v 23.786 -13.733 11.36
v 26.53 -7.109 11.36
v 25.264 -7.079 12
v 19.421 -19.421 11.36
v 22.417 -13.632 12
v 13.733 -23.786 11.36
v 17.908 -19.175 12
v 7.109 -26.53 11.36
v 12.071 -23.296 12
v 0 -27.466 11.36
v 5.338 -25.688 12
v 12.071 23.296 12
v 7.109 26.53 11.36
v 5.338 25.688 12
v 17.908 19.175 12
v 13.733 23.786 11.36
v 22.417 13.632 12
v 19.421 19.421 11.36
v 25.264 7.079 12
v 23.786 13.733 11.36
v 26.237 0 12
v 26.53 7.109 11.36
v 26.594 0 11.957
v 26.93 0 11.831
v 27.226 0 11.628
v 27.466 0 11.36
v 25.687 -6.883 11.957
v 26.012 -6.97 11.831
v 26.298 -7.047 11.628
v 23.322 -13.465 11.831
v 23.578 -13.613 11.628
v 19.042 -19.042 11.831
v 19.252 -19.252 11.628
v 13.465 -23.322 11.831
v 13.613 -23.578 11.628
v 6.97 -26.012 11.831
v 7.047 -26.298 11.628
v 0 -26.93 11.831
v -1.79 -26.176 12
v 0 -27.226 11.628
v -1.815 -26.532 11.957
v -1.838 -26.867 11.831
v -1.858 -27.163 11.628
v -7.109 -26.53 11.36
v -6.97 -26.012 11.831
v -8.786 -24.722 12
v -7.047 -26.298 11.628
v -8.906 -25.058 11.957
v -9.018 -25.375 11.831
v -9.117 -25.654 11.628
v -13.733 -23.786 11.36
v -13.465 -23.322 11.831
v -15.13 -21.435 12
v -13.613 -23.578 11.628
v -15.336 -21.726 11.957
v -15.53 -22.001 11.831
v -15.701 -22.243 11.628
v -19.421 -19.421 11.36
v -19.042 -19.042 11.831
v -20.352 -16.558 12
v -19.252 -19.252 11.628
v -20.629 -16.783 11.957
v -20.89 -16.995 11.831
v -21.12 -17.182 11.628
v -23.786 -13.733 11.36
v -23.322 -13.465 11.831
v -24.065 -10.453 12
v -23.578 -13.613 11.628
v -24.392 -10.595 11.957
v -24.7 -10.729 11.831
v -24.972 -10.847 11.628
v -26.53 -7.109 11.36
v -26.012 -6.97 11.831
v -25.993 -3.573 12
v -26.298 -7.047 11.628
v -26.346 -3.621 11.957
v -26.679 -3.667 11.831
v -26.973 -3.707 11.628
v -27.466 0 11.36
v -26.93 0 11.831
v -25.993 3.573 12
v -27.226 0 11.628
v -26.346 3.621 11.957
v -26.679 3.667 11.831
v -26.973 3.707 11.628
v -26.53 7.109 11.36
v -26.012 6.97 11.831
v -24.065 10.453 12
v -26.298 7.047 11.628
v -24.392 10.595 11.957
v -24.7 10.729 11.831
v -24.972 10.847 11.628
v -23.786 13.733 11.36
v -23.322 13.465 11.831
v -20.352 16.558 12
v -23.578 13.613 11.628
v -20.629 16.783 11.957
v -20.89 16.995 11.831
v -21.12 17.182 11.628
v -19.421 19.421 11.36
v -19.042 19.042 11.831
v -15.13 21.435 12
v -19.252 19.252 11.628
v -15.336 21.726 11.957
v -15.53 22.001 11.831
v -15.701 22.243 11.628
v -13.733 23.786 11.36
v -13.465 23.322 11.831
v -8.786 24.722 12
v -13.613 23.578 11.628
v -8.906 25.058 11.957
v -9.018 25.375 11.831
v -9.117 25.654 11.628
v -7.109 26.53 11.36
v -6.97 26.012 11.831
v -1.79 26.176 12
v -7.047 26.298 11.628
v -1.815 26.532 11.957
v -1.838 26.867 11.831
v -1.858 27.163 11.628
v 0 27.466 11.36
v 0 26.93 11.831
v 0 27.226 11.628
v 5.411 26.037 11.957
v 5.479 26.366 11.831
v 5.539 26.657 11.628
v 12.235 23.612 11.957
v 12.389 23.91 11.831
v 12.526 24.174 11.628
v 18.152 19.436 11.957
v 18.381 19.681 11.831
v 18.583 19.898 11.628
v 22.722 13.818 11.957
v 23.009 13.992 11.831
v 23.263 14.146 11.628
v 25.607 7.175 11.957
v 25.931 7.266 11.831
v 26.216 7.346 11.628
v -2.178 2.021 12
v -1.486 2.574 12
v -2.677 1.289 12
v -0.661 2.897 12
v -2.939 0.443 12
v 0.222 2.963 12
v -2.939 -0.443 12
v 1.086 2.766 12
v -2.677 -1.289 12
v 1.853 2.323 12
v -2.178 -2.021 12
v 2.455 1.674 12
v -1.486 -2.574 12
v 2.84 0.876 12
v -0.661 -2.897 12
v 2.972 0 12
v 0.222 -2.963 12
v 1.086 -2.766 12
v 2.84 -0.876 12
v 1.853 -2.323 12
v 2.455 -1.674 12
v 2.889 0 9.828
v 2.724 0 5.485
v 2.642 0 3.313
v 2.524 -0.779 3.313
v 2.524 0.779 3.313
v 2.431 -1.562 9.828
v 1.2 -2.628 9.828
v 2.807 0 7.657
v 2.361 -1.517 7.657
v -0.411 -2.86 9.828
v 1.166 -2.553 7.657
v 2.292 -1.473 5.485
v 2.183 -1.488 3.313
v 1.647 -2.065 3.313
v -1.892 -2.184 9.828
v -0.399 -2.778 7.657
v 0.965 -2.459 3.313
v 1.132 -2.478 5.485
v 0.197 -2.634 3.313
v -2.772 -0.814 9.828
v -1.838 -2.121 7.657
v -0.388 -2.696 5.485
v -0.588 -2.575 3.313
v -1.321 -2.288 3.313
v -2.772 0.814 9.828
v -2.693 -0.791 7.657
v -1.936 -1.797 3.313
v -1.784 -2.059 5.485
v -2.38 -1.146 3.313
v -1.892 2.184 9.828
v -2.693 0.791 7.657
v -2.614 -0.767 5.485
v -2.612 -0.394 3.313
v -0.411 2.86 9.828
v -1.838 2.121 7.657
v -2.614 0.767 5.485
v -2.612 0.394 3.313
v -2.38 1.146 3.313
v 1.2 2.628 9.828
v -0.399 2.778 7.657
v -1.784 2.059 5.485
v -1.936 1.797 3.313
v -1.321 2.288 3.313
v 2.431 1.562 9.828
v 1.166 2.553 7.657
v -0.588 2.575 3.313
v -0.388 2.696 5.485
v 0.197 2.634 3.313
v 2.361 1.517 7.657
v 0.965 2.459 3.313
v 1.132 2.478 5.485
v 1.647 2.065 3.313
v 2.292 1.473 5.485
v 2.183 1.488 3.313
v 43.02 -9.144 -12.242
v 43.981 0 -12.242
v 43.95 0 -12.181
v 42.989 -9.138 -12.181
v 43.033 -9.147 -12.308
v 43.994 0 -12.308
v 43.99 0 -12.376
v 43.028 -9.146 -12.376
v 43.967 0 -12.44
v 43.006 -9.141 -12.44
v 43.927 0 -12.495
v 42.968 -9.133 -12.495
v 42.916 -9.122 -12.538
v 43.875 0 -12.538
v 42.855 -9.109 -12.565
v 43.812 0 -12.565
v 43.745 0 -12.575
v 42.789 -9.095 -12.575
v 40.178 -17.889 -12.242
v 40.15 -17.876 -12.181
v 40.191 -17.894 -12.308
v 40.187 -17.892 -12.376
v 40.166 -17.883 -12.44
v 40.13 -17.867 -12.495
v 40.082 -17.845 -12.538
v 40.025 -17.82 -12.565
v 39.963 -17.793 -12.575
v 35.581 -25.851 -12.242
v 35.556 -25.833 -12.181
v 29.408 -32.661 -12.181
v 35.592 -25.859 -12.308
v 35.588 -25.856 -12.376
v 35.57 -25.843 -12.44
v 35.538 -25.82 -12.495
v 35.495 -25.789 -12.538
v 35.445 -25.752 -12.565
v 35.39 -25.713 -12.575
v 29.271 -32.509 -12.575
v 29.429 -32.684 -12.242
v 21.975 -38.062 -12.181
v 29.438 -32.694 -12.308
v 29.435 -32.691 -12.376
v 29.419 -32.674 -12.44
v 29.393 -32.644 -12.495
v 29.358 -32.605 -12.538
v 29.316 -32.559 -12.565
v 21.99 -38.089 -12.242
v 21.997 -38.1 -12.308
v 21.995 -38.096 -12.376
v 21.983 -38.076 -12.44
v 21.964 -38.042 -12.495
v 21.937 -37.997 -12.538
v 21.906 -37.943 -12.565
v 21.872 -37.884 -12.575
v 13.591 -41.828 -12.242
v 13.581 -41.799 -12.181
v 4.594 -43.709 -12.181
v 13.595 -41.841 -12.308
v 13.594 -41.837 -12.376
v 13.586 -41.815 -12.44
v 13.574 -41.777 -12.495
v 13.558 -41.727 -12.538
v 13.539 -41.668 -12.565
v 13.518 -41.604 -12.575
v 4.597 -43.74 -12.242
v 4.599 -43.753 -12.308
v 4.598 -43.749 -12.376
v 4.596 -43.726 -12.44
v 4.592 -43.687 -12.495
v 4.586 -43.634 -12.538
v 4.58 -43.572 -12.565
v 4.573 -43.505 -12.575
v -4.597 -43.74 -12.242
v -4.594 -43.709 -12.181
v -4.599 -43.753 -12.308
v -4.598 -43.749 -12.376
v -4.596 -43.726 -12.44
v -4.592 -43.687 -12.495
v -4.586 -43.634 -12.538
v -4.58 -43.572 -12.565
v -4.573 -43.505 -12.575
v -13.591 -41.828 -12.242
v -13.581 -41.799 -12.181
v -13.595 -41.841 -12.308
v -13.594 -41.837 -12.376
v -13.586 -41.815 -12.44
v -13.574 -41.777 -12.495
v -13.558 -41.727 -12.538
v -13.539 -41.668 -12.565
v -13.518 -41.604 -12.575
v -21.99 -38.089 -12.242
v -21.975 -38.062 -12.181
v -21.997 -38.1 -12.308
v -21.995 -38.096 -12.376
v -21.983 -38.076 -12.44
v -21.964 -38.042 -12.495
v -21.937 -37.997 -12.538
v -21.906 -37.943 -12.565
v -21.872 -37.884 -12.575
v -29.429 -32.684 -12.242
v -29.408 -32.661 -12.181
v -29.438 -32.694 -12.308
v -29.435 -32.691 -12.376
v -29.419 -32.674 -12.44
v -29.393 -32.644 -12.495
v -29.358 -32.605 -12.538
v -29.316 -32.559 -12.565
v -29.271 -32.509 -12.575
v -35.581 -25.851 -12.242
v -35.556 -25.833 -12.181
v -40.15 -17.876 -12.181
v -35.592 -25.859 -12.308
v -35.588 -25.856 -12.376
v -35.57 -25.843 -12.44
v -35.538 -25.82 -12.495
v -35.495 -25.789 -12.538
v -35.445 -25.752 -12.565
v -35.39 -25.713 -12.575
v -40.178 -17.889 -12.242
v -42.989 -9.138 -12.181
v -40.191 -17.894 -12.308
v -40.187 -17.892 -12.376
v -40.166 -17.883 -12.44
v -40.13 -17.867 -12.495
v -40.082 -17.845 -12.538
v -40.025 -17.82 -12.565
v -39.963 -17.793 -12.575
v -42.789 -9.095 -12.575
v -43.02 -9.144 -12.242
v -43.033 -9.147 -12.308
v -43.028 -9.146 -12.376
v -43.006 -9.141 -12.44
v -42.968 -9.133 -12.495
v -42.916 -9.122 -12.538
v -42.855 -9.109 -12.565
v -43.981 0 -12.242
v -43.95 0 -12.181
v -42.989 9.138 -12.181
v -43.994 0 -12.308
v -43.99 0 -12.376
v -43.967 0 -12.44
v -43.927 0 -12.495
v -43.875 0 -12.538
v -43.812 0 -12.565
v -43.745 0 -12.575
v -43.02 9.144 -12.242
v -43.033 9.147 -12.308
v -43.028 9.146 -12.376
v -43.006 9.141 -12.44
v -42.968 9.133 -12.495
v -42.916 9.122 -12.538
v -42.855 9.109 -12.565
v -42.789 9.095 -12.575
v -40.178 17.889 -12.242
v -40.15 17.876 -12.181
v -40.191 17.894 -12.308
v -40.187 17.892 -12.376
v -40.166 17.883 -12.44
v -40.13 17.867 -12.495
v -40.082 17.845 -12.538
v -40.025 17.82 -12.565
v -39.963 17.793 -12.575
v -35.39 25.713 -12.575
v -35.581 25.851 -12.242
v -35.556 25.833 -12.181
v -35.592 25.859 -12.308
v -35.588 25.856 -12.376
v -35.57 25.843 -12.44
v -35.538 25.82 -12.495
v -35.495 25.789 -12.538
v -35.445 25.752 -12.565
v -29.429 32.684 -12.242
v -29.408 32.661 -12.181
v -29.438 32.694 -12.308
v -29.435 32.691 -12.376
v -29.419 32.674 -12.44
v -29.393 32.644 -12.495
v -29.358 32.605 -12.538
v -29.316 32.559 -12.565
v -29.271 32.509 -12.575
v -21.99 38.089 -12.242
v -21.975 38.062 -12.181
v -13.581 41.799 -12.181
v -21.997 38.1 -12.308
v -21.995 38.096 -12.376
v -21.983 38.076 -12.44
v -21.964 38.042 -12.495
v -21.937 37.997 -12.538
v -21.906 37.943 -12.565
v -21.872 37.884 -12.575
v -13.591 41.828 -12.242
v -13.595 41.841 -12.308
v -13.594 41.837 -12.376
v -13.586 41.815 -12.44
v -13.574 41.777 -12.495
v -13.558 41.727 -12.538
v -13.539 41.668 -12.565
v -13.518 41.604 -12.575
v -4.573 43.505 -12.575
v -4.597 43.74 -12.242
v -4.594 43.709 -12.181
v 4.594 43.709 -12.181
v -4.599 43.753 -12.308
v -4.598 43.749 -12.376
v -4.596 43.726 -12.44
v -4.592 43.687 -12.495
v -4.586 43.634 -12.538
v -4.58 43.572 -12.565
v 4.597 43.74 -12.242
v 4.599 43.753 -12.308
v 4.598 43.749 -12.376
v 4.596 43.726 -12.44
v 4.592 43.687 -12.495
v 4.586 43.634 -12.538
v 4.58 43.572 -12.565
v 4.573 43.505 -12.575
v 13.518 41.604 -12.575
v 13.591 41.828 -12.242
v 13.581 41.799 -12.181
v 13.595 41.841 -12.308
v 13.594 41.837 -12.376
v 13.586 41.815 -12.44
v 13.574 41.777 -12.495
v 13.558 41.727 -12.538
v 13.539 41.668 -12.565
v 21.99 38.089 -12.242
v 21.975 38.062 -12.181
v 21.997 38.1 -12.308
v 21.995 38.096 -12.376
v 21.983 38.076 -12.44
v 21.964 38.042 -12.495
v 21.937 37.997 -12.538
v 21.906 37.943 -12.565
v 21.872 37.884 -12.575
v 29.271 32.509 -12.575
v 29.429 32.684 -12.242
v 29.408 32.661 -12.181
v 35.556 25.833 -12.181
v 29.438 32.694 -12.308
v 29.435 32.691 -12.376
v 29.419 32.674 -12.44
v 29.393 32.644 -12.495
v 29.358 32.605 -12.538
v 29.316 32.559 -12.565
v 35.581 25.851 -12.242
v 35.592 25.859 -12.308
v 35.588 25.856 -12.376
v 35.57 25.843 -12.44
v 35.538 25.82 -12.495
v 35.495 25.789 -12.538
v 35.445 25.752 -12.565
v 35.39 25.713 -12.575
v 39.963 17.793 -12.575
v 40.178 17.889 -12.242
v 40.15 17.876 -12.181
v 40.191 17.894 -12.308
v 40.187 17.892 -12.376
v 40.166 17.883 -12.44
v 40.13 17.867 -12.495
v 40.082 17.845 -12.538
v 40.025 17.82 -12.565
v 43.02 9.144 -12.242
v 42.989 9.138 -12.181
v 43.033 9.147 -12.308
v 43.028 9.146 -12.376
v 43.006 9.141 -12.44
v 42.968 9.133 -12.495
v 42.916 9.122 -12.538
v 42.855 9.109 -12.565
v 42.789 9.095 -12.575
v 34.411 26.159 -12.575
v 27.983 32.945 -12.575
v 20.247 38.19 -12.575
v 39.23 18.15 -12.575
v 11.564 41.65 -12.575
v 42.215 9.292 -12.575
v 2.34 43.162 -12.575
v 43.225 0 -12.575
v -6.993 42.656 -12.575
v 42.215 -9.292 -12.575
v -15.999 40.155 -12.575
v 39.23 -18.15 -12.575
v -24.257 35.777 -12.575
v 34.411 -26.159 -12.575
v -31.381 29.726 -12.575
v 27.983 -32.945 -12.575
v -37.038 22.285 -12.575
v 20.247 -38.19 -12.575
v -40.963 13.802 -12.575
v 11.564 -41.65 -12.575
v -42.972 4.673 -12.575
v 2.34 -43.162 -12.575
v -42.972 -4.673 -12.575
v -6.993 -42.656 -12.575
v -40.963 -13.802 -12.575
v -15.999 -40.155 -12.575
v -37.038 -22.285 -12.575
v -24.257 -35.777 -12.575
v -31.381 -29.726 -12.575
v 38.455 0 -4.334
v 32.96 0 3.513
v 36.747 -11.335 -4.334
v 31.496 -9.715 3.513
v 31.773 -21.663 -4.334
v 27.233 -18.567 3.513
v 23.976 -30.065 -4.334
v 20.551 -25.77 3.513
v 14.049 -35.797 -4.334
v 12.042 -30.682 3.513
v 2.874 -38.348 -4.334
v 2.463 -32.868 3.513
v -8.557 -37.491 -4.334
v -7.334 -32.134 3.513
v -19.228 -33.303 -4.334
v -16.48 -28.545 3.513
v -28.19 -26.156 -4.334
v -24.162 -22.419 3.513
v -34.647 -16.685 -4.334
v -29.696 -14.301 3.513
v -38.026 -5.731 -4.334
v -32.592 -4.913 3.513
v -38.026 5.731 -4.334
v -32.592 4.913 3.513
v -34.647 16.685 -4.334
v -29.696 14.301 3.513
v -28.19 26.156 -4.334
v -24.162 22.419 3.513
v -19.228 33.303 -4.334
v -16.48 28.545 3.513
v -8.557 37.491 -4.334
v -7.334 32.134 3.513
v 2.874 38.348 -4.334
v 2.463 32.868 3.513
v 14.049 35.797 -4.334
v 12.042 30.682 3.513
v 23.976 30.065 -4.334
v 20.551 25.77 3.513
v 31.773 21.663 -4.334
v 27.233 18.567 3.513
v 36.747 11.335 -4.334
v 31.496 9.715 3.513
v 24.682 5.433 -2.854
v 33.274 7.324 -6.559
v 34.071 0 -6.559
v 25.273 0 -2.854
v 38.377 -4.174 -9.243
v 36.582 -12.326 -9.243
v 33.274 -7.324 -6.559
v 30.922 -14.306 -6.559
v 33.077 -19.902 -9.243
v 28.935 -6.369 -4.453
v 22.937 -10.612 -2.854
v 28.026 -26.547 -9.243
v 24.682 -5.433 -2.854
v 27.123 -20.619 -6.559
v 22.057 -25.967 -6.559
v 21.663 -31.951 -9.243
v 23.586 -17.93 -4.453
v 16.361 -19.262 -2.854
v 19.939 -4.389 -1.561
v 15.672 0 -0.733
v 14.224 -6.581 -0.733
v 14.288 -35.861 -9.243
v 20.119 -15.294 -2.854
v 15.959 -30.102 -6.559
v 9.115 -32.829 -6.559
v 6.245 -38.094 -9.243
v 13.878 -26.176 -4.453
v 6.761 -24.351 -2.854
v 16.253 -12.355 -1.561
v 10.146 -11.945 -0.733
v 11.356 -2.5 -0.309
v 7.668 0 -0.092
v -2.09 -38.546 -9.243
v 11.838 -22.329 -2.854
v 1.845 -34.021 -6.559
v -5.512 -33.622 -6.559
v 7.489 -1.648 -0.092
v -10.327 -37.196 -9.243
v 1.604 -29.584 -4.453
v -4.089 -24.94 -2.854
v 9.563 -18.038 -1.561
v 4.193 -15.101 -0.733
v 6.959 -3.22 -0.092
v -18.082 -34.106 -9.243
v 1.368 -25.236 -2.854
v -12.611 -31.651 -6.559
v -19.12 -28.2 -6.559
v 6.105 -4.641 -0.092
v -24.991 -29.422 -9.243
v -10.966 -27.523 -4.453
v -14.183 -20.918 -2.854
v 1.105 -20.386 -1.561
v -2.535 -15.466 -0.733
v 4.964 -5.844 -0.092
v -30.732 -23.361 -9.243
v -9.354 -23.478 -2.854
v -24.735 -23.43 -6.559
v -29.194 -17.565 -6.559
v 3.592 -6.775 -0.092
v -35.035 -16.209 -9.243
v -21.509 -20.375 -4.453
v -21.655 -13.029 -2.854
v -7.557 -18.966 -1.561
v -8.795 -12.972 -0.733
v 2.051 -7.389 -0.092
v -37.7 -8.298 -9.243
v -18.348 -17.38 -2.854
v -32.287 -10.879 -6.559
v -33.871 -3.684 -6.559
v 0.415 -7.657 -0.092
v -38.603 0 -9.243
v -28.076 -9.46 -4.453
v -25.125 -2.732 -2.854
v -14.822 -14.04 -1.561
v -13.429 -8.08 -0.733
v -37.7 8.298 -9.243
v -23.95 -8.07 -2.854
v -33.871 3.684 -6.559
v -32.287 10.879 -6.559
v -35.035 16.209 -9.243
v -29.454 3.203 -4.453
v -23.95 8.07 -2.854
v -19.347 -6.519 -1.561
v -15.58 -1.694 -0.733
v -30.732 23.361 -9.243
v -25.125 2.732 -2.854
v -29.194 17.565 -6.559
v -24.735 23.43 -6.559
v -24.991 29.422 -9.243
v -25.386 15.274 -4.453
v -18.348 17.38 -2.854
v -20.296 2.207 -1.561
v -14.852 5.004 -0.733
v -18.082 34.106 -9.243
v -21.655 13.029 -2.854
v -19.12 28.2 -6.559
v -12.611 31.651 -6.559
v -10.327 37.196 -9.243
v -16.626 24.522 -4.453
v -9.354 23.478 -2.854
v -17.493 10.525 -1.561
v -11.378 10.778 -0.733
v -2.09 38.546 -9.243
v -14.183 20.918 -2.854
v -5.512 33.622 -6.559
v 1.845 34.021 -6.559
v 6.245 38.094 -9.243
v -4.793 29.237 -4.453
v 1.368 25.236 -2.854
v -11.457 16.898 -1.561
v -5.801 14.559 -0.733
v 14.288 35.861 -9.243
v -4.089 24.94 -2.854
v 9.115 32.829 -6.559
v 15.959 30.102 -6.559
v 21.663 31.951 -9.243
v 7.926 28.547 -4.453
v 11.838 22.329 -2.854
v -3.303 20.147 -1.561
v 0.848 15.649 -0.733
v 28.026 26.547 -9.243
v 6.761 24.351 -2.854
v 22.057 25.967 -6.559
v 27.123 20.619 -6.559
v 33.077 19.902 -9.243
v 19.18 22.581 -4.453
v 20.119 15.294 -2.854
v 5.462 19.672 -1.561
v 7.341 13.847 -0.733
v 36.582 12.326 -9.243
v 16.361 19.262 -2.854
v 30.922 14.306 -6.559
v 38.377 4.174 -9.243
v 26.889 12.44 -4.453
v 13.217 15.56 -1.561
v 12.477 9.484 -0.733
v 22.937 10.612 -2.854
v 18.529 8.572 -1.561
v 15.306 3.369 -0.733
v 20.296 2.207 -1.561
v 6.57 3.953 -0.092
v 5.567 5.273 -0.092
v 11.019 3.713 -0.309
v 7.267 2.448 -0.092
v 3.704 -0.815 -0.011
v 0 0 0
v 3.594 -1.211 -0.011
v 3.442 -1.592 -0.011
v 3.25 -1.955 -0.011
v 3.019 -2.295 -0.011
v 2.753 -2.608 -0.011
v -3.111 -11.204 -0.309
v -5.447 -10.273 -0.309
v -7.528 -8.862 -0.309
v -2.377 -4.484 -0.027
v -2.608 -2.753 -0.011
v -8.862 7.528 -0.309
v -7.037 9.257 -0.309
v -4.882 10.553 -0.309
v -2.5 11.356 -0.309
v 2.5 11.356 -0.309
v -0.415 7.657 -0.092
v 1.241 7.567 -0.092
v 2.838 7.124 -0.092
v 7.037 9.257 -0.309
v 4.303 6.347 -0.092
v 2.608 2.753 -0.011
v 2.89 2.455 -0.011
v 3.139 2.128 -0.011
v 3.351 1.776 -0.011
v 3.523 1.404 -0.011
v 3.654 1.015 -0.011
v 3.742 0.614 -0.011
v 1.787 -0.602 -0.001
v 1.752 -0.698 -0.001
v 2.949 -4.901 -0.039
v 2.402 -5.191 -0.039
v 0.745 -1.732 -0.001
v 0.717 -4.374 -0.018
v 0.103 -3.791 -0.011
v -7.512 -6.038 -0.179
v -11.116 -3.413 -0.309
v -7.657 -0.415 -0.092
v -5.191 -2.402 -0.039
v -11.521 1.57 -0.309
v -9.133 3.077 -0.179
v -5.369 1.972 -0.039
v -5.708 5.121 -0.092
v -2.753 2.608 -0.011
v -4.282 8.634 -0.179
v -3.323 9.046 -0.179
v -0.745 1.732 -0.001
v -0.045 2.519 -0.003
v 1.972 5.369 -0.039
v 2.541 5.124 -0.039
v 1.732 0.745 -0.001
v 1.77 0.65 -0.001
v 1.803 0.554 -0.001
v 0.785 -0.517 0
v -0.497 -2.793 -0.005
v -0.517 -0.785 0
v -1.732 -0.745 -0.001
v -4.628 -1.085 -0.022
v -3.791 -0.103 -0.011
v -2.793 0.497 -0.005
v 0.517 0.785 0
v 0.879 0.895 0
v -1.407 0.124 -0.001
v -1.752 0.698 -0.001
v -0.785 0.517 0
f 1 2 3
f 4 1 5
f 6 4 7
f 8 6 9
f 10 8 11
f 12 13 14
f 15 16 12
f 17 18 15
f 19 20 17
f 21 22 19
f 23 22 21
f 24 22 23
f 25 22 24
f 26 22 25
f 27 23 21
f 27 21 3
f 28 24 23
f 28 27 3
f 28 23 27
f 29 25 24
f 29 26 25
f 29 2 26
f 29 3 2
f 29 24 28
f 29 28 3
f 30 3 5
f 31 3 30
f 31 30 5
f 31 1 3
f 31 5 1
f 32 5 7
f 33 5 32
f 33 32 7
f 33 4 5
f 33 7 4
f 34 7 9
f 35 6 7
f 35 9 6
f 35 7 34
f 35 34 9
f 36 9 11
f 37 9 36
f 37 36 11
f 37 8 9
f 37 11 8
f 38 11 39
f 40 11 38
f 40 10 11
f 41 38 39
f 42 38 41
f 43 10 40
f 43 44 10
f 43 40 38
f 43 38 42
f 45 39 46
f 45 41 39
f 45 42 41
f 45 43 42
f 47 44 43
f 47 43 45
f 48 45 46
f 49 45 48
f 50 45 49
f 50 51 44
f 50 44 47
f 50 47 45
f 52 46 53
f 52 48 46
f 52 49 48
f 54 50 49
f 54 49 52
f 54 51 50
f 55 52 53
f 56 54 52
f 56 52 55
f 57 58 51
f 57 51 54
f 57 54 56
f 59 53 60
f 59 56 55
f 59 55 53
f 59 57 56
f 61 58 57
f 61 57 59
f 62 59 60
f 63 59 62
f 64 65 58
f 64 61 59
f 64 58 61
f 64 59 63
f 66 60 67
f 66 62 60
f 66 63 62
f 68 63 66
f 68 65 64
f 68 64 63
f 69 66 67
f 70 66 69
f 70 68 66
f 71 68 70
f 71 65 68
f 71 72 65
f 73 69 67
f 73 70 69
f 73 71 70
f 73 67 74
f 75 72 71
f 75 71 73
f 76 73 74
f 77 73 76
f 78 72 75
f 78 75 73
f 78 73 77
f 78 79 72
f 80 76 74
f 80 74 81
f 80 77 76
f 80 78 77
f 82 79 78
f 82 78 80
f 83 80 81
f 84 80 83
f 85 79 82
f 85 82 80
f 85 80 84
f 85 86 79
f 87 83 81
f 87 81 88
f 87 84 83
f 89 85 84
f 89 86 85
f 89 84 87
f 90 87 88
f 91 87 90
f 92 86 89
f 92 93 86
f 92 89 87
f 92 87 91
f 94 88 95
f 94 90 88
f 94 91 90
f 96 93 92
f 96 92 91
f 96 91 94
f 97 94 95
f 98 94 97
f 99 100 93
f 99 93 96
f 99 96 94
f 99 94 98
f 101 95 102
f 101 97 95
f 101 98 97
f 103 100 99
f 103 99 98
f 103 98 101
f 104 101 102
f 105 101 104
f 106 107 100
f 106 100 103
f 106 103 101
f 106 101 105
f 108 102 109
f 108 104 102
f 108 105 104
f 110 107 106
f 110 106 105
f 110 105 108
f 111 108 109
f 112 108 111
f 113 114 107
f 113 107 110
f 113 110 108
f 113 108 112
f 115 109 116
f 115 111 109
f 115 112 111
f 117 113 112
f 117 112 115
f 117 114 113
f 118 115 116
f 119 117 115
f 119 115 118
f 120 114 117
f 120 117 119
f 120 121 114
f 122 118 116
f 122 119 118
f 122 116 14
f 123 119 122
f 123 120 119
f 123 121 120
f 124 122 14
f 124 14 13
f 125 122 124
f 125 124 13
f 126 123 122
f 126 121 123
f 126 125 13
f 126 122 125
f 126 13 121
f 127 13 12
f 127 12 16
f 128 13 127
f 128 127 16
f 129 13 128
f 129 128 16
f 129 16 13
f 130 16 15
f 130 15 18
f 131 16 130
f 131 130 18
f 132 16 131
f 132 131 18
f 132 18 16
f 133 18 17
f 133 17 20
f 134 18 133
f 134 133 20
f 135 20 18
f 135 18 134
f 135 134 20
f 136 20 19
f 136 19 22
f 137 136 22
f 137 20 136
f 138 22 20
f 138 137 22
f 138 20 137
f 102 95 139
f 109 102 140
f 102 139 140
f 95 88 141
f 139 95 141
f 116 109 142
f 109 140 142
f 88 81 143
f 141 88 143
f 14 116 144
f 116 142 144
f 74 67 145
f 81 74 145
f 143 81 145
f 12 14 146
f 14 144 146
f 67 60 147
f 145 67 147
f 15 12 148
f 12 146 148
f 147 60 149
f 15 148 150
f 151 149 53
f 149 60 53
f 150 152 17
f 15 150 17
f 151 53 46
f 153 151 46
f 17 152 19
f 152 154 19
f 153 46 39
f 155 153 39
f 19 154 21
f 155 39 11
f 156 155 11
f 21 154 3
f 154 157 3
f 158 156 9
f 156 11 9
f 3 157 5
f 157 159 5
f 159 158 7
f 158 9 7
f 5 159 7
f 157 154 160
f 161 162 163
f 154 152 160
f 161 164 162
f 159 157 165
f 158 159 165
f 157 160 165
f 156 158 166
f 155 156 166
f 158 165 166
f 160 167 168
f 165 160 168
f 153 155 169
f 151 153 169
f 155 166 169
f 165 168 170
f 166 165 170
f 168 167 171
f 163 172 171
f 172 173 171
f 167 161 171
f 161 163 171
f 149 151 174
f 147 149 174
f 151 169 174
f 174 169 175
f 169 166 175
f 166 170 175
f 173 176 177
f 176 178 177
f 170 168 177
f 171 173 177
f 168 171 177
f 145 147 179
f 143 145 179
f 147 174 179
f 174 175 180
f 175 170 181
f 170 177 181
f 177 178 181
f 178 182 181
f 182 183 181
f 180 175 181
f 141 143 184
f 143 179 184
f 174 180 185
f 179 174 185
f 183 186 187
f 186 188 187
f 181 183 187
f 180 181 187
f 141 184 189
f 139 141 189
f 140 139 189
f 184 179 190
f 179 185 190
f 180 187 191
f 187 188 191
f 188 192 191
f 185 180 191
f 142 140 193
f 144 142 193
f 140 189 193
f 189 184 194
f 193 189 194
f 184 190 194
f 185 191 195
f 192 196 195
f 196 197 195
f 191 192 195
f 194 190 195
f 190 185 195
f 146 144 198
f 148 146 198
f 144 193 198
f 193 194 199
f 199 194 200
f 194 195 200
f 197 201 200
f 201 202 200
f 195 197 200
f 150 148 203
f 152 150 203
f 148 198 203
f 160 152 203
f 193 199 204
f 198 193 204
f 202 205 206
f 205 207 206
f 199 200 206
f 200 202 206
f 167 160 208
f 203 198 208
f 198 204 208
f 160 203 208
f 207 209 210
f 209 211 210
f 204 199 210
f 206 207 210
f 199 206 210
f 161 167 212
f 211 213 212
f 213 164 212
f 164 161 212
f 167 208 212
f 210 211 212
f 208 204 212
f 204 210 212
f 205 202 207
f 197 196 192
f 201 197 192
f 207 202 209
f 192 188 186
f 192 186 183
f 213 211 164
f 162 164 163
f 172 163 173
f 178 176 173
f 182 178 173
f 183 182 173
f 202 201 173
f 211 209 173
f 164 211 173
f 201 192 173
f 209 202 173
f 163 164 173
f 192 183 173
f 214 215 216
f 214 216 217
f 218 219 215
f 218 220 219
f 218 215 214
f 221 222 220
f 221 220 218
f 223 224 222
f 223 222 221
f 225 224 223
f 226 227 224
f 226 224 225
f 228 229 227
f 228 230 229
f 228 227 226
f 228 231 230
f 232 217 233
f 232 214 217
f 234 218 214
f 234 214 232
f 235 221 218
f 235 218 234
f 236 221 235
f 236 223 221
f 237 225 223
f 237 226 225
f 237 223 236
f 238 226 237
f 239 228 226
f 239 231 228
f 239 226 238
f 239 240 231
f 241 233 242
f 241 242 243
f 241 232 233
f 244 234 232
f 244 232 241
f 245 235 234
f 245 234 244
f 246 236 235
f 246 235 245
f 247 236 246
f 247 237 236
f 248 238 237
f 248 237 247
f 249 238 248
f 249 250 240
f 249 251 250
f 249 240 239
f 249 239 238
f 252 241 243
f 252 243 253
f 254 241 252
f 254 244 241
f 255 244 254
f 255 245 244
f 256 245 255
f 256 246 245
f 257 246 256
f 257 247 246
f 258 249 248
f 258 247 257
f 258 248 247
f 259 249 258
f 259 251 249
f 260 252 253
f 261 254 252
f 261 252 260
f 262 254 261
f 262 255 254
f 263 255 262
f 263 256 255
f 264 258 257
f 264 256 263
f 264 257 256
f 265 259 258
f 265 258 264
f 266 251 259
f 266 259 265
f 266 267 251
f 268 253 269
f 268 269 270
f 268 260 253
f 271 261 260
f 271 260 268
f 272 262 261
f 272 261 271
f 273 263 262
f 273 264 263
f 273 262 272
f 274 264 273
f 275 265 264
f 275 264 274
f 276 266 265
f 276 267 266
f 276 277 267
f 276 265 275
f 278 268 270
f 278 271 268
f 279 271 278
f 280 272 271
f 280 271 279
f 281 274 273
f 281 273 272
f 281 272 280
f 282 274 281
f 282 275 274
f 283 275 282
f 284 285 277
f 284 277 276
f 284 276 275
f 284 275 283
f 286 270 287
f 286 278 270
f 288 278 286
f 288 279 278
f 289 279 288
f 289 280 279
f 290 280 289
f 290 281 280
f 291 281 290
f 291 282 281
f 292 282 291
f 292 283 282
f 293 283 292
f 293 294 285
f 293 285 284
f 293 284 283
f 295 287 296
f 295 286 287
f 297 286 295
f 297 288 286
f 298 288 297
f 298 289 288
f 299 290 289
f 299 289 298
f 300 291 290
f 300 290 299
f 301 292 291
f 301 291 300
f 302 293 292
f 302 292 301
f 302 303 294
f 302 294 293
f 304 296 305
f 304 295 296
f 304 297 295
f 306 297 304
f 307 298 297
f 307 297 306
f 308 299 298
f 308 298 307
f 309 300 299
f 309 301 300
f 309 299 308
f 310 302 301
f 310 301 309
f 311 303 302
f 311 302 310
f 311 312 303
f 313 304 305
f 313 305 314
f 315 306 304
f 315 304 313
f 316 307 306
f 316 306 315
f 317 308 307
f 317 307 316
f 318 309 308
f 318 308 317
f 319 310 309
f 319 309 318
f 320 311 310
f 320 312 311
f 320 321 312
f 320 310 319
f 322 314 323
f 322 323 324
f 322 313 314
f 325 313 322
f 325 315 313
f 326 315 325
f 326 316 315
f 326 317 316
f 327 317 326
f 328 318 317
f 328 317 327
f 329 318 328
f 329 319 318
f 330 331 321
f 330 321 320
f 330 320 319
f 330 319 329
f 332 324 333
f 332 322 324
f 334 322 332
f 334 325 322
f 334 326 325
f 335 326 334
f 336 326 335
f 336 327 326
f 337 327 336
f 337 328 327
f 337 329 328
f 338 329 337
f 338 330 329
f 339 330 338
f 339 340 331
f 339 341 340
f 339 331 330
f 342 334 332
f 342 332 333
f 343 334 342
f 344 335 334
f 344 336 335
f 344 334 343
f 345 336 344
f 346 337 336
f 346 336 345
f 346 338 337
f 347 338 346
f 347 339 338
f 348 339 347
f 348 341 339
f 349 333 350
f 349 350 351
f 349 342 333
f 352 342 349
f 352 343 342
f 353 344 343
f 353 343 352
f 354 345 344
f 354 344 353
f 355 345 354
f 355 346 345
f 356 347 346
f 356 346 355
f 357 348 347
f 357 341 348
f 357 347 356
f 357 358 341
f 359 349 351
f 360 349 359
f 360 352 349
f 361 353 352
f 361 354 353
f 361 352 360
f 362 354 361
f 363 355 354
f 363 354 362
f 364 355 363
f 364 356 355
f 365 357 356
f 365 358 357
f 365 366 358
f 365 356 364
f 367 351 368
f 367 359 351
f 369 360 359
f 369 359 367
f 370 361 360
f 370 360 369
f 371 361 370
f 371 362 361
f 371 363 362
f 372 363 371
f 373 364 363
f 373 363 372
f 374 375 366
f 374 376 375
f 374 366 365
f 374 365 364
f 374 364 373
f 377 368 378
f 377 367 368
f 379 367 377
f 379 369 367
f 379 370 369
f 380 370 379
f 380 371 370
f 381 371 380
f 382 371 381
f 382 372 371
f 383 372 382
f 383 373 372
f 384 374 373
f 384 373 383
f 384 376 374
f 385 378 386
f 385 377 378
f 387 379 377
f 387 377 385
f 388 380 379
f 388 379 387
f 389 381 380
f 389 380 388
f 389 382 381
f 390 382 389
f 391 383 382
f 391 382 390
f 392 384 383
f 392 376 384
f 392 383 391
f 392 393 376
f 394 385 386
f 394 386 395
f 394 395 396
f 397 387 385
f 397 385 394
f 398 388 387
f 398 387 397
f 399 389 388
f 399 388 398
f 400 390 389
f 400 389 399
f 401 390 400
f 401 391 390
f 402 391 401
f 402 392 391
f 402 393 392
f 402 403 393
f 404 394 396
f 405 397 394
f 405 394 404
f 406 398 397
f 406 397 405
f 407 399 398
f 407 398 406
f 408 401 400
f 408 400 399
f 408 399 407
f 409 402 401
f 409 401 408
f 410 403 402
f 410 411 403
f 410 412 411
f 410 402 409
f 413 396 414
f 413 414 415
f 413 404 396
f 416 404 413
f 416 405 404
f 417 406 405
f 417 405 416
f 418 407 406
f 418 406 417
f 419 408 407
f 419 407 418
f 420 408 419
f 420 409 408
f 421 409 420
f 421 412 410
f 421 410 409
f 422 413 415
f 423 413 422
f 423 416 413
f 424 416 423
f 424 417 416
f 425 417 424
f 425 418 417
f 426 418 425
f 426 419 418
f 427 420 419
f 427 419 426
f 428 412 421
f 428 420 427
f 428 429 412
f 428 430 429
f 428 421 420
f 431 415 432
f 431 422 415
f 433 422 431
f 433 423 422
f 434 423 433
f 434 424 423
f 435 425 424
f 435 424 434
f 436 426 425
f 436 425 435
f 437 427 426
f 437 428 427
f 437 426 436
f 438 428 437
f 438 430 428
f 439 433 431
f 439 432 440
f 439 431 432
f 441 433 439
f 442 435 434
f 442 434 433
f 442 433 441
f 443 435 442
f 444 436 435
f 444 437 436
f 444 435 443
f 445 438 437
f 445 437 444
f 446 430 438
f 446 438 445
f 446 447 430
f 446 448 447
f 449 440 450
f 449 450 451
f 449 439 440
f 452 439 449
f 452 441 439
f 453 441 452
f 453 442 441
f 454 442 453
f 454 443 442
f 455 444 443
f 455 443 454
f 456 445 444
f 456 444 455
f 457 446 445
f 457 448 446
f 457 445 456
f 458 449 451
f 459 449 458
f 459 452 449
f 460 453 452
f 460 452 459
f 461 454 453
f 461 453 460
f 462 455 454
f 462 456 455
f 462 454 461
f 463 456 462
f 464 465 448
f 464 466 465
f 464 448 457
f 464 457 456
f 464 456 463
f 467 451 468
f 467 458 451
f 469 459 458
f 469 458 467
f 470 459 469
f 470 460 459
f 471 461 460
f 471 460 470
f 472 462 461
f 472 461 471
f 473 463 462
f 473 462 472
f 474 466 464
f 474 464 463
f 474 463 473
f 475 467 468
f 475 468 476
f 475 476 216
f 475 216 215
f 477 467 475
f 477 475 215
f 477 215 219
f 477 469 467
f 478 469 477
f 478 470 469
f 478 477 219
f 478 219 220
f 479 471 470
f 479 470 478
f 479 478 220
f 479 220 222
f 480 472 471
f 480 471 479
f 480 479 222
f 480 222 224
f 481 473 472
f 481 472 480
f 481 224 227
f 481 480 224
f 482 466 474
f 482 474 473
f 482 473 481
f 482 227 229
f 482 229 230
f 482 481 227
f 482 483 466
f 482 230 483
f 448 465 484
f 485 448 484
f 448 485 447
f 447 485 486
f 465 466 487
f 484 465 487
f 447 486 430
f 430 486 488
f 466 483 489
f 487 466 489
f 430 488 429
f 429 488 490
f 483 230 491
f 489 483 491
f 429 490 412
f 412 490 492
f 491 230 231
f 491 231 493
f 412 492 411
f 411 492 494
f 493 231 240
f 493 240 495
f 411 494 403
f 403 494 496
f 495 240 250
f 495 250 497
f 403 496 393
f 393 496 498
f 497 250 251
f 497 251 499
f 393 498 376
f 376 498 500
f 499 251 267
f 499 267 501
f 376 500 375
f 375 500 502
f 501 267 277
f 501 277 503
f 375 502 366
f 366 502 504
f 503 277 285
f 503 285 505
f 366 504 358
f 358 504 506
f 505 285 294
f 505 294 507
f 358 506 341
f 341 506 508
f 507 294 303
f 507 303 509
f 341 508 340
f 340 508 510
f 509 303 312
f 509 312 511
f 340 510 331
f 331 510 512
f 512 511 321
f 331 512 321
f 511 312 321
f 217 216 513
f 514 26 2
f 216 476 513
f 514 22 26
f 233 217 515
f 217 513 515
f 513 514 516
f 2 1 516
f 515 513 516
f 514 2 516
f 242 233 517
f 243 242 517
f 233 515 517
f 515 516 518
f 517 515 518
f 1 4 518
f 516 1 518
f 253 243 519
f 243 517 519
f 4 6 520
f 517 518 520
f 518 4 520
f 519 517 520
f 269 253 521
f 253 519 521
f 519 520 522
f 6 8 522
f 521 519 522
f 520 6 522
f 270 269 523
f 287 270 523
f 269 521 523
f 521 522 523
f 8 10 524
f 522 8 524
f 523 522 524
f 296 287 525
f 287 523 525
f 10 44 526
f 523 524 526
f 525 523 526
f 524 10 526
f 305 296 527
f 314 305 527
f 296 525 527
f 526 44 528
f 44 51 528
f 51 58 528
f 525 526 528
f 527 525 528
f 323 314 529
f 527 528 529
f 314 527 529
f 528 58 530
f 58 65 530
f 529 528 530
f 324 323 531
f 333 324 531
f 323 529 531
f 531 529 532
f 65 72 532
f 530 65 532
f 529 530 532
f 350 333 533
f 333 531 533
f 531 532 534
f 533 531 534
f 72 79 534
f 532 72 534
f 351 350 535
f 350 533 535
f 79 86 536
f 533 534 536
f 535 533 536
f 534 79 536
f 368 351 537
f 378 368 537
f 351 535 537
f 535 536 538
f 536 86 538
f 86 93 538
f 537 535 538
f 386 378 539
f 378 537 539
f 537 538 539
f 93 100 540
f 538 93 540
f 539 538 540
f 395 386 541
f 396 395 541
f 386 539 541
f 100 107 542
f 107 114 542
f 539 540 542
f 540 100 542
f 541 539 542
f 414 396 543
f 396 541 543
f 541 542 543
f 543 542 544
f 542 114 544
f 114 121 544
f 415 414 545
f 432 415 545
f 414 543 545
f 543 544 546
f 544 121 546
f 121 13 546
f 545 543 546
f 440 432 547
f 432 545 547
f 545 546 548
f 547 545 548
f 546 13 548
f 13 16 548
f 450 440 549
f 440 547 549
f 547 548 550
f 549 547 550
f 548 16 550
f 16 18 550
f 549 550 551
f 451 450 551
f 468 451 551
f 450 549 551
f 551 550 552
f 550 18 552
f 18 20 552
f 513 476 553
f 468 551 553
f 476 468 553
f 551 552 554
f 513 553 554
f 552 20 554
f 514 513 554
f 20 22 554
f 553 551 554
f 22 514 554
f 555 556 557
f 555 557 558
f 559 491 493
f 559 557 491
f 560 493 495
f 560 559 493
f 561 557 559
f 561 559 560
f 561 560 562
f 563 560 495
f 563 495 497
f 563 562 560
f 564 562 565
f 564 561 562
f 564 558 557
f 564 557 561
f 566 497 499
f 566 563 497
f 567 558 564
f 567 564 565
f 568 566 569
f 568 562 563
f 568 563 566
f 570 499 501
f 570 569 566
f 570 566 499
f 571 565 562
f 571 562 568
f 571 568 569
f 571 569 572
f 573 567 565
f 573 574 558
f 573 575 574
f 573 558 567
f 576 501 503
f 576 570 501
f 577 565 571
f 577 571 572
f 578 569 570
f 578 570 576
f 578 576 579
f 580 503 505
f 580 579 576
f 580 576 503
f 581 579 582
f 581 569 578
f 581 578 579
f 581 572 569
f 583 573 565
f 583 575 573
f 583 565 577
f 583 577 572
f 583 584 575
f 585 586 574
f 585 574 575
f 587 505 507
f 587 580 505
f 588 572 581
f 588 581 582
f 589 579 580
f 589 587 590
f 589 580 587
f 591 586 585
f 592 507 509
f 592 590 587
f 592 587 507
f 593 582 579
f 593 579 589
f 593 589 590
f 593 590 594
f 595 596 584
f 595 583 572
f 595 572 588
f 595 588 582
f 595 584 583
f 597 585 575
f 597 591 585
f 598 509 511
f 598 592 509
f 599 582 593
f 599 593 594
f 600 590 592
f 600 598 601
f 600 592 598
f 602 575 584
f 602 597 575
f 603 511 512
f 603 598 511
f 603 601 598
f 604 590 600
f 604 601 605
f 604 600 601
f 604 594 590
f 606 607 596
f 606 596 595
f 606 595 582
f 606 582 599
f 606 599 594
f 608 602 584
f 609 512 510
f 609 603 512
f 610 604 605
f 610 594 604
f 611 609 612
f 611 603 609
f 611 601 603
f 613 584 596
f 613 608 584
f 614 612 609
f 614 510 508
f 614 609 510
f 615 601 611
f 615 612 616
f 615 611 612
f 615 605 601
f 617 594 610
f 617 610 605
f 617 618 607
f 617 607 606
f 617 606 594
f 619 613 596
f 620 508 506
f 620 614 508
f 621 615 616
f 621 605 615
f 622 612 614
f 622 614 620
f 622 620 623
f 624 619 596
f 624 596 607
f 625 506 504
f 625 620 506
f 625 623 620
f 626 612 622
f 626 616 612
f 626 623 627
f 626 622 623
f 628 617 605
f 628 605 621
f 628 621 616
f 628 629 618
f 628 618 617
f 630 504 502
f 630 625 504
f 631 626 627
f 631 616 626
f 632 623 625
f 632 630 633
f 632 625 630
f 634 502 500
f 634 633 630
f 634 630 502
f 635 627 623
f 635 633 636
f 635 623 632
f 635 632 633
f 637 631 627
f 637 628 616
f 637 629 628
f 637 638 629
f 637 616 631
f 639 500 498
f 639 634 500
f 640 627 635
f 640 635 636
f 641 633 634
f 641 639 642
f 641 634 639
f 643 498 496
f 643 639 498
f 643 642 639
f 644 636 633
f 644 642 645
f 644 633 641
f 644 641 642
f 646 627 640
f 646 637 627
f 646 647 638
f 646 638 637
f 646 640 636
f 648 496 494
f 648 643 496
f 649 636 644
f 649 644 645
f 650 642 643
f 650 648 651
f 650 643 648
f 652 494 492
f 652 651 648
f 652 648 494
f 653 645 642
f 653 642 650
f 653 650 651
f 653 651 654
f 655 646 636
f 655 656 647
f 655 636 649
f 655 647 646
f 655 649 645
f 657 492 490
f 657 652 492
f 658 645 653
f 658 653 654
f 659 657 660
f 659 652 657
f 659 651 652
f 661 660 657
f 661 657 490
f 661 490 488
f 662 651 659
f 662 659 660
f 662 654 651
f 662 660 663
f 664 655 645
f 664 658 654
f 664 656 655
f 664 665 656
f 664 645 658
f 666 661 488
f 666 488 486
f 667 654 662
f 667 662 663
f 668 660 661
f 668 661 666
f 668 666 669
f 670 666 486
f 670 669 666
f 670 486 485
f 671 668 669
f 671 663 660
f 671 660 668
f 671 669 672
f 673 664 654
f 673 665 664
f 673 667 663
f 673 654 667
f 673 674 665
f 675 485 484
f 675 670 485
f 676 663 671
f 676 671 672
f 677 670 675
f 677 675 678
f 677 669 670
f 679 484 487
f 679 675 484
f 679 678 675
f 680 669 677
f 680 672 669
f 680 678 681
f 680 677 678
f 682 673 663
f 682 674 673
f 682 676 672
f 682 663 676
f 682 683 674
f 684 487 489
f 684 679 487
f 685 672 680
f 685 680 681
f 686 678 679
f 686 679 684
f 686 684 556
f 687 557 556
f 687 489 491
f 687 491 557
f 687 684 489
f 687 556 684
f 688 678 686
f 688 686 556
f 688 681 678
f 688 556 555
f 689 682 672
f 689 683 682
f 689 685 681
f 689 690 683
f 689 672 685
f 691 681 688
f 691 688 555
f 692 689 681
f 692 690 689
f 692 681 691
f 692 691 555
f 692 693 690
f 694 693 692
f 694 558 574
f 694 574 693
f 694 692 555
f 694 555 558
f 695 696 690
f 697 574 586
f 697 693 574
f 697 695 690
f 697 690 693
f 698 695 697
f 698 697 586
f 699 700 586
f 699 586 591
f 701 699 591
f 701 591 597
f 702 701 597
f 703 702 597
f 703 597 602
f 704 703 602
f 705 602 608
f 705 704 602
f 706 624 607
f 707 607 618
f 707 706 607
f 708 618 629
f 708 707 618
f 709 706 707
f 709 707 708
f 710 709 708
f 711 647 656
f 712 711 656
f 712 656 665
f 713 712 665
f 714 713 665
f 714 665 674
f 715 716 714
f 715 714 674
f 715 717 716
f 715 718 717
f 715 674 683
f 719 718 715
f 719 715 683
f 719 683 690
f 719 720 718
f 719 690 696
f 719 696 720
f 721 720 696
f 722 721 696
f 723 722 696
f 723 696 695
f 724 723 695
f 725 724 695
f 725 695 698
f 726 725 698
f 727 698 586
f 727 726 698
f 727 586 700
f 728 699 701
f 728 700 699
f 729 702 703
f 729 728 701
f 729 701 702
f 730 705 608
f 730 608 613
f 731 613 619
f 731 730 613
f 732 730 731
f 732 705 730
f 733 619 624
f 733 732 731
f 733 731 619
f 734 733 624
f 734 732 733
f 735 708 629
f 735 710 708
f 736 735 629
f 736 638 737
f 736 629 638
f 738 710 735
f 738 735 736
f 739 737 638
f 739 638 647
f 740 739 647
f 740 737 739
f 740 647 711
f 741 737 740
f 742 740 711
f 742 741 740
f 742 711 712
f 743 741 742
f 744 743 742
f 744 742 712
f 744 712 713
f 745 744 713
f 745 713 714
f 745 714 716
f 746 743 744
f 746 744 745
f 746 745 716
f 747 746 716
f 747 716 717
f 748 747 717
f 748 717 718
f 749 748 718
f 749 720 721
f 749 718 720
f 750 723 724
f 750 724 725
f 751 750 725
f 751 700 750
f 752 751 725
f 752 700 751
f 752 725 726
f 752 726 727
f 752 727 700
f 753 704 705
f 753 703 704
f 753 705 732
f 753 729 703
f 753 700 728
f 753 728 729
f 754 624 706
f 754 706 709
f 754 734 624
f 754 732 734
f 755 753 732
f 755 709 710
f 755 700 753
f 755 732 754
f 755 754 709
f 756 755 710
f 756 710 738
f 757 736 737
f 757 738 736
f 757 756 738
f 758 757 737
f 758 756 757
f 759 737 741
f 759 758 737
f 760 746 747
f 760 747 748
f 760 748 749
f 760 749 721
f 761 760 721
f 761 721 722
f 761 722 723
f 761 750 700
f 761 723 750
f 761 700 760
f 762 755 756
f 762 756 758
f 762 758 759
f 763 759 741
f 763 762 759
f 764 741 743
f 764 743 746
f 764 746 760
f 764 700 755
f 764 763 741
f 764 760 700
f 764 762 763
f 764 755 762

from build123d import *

# Parameters (mm, degrees)
F2_R = 1.5
F3_R = 0.25


with BuildPart() as f1:
    # F0 (on Front) → F1 (revolve)
    with BuildSketch(Plane.XZ):
        with BuildLine():
            Line((27.017928, 12), (2.9718, 12))
            Line((2.9718, 12), (2.6416, 3.3132))
            Line((2.6416, 3.3132), (0, 3.3132))
            Line((0, 3.3132), (0, 0))
            add(Edge.make_bspline(
                [(43.225221, -12.574561), (27.26946, 0), (12.901129, 0), (0, 0)],
                knots=[0, 0, 0, 0, 45.017101, 45.017101, 45.017101, 45.017101], degree=3))
            Line((43.225221, -12.574561), (44.225221, -12.574561))
            Line((44.225221, -12.574561), (27.017928, 12))
        make_face()
    revolve(axis=Axis((0, 0, -5.435105), (0, 0, -1)))

    # F2
    f2_edges = [f1.edges().sort_by_distance(p)[0] for p in [
        (-27.017928, 0, 12),
    ]]
    fillet(f2_edges, radius=F2_R)

    # F3
    f3_edges = [f1.edges().sort_by_distance(p)[0] for p in [
        (-44.225221, 0, -12.574561),
    ]]
    fillet(f3_edges, radius=F3_R)


solid = f1.part
